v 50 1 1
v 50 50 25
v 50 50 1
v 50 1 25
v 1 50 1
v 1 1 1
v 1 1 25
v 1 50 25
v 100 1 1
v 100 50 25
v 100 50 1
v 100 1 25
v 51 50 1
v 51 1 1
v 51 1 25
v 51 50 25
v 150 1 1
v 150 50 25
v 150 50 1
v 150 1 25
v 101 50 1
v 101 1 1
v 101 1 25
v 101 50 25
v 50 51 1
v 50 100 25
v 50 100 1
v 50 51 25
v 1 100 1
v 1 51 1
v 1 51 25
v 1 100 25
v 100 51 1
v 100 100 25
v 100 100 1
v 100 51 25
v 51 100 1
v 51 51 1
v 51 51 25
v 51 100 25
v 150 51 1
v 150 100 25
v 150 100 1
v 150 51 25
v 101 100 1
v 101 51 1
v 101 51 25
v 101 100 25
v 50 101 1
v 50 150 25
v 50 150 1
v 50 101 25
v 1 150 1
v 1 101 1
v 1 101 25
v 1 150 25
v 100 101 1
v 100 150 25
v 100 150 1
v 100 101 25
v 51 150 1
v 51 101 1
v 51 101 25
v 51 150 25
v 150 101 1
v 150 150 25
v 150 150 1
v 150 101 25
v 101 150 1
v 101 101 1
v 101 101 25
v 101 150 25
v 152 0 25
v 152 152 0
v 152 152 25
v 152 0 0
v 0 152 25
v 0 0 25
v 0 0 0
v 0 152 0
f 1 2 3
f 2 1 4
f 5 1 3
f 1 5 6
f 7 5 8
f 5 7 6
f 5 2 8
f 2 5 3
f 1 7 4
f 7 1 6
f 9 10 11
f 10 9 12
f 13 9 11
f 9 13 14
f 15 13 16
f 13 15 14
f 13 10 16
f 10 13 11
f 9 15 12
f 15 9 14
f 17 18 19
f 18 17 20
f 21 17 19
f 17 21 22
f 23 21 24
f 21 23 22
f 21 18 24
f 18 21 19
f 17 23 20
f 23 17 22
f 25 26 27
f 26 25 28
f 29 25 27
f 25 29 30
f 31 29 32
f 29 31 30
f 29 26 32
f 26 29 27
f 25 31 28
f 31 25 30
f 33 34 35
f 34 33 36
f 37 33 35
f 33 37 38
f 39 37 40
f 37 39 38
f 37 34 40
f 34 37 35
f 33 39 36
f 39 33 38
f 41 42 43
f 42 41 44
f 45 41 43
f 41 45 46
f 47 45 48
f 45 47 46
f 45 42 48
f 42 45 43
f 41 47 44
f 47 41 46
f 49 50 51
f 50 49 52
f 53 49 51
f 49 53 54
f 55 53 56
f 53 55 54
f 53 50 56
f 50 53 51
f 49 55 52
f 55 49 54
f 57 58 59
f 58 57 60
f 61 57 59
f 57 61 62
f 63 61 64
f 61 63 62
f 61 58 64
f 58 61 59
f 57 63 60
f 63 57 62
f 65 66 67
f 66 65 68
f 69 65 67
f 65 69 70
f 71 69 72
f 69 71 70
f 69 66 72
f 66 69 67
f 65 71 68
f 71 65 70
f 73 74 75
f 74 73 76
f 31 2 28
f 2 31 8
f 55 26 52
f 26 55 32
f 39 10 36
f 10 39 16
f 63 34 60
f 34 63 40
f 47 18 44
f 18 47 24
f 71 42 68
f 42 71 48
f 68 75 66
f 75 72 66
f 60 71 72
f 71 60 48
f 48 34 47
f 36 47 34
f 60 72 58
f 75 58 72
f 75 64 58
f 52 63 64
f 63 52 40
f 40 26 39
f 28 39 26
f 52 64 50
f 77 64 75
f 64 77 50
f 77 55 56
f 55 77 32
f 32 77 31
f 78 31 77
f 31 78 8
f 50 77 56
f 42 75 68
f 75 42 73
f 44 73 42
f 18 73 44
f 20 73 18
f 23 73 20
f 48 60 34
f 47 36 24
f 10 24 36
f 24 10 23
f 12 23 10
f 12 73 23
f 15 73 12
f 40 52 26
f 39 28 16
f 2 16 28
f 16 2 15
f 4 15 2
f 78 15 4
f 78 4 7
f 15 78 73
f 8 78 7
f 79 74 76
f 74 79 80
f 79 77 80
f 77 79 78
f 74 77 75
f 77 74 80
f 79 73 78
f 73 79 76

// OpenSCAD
opacity_cube = .5;
width_cube = 150 + 2;
height_cube = 150 + 2;
depth_cube = 25;

first_layers = 1;

inner_width = width_cube - 2;
inner_height = height_cube - 2;
inner_depth = depth_cube;

rows = 3;
columns = 3;

compartment_width = inner_width / columns;
compartment_height = inner_height / rows;

module generate_cube(){  
    color("blue", opacity_cube)
    cube([width_cube, height_cube, depth_cube]);
}

module generate_inner_cube(){
    cube([inner_width, inner_height, inner_depth]);
}

module generate_grid(){
    for (r = [0:rows-1]) {
        for (c = [0:columns-1]) {
            translate([
                compartment_width * c + (width_cube - inner_width) / 2,
                compartment_height * r + (height_cube - inner_height) / 2,
                first_layers
            ])
            cube([
                compartment_width - 1,
                compartment_height - 1,
                inner_depth
            ]);
        }
    }
}

module generate_without_innercube(){
    difference() {
        generate_cube();
        generate_grid();
    }
}

generate_without_innercube();
